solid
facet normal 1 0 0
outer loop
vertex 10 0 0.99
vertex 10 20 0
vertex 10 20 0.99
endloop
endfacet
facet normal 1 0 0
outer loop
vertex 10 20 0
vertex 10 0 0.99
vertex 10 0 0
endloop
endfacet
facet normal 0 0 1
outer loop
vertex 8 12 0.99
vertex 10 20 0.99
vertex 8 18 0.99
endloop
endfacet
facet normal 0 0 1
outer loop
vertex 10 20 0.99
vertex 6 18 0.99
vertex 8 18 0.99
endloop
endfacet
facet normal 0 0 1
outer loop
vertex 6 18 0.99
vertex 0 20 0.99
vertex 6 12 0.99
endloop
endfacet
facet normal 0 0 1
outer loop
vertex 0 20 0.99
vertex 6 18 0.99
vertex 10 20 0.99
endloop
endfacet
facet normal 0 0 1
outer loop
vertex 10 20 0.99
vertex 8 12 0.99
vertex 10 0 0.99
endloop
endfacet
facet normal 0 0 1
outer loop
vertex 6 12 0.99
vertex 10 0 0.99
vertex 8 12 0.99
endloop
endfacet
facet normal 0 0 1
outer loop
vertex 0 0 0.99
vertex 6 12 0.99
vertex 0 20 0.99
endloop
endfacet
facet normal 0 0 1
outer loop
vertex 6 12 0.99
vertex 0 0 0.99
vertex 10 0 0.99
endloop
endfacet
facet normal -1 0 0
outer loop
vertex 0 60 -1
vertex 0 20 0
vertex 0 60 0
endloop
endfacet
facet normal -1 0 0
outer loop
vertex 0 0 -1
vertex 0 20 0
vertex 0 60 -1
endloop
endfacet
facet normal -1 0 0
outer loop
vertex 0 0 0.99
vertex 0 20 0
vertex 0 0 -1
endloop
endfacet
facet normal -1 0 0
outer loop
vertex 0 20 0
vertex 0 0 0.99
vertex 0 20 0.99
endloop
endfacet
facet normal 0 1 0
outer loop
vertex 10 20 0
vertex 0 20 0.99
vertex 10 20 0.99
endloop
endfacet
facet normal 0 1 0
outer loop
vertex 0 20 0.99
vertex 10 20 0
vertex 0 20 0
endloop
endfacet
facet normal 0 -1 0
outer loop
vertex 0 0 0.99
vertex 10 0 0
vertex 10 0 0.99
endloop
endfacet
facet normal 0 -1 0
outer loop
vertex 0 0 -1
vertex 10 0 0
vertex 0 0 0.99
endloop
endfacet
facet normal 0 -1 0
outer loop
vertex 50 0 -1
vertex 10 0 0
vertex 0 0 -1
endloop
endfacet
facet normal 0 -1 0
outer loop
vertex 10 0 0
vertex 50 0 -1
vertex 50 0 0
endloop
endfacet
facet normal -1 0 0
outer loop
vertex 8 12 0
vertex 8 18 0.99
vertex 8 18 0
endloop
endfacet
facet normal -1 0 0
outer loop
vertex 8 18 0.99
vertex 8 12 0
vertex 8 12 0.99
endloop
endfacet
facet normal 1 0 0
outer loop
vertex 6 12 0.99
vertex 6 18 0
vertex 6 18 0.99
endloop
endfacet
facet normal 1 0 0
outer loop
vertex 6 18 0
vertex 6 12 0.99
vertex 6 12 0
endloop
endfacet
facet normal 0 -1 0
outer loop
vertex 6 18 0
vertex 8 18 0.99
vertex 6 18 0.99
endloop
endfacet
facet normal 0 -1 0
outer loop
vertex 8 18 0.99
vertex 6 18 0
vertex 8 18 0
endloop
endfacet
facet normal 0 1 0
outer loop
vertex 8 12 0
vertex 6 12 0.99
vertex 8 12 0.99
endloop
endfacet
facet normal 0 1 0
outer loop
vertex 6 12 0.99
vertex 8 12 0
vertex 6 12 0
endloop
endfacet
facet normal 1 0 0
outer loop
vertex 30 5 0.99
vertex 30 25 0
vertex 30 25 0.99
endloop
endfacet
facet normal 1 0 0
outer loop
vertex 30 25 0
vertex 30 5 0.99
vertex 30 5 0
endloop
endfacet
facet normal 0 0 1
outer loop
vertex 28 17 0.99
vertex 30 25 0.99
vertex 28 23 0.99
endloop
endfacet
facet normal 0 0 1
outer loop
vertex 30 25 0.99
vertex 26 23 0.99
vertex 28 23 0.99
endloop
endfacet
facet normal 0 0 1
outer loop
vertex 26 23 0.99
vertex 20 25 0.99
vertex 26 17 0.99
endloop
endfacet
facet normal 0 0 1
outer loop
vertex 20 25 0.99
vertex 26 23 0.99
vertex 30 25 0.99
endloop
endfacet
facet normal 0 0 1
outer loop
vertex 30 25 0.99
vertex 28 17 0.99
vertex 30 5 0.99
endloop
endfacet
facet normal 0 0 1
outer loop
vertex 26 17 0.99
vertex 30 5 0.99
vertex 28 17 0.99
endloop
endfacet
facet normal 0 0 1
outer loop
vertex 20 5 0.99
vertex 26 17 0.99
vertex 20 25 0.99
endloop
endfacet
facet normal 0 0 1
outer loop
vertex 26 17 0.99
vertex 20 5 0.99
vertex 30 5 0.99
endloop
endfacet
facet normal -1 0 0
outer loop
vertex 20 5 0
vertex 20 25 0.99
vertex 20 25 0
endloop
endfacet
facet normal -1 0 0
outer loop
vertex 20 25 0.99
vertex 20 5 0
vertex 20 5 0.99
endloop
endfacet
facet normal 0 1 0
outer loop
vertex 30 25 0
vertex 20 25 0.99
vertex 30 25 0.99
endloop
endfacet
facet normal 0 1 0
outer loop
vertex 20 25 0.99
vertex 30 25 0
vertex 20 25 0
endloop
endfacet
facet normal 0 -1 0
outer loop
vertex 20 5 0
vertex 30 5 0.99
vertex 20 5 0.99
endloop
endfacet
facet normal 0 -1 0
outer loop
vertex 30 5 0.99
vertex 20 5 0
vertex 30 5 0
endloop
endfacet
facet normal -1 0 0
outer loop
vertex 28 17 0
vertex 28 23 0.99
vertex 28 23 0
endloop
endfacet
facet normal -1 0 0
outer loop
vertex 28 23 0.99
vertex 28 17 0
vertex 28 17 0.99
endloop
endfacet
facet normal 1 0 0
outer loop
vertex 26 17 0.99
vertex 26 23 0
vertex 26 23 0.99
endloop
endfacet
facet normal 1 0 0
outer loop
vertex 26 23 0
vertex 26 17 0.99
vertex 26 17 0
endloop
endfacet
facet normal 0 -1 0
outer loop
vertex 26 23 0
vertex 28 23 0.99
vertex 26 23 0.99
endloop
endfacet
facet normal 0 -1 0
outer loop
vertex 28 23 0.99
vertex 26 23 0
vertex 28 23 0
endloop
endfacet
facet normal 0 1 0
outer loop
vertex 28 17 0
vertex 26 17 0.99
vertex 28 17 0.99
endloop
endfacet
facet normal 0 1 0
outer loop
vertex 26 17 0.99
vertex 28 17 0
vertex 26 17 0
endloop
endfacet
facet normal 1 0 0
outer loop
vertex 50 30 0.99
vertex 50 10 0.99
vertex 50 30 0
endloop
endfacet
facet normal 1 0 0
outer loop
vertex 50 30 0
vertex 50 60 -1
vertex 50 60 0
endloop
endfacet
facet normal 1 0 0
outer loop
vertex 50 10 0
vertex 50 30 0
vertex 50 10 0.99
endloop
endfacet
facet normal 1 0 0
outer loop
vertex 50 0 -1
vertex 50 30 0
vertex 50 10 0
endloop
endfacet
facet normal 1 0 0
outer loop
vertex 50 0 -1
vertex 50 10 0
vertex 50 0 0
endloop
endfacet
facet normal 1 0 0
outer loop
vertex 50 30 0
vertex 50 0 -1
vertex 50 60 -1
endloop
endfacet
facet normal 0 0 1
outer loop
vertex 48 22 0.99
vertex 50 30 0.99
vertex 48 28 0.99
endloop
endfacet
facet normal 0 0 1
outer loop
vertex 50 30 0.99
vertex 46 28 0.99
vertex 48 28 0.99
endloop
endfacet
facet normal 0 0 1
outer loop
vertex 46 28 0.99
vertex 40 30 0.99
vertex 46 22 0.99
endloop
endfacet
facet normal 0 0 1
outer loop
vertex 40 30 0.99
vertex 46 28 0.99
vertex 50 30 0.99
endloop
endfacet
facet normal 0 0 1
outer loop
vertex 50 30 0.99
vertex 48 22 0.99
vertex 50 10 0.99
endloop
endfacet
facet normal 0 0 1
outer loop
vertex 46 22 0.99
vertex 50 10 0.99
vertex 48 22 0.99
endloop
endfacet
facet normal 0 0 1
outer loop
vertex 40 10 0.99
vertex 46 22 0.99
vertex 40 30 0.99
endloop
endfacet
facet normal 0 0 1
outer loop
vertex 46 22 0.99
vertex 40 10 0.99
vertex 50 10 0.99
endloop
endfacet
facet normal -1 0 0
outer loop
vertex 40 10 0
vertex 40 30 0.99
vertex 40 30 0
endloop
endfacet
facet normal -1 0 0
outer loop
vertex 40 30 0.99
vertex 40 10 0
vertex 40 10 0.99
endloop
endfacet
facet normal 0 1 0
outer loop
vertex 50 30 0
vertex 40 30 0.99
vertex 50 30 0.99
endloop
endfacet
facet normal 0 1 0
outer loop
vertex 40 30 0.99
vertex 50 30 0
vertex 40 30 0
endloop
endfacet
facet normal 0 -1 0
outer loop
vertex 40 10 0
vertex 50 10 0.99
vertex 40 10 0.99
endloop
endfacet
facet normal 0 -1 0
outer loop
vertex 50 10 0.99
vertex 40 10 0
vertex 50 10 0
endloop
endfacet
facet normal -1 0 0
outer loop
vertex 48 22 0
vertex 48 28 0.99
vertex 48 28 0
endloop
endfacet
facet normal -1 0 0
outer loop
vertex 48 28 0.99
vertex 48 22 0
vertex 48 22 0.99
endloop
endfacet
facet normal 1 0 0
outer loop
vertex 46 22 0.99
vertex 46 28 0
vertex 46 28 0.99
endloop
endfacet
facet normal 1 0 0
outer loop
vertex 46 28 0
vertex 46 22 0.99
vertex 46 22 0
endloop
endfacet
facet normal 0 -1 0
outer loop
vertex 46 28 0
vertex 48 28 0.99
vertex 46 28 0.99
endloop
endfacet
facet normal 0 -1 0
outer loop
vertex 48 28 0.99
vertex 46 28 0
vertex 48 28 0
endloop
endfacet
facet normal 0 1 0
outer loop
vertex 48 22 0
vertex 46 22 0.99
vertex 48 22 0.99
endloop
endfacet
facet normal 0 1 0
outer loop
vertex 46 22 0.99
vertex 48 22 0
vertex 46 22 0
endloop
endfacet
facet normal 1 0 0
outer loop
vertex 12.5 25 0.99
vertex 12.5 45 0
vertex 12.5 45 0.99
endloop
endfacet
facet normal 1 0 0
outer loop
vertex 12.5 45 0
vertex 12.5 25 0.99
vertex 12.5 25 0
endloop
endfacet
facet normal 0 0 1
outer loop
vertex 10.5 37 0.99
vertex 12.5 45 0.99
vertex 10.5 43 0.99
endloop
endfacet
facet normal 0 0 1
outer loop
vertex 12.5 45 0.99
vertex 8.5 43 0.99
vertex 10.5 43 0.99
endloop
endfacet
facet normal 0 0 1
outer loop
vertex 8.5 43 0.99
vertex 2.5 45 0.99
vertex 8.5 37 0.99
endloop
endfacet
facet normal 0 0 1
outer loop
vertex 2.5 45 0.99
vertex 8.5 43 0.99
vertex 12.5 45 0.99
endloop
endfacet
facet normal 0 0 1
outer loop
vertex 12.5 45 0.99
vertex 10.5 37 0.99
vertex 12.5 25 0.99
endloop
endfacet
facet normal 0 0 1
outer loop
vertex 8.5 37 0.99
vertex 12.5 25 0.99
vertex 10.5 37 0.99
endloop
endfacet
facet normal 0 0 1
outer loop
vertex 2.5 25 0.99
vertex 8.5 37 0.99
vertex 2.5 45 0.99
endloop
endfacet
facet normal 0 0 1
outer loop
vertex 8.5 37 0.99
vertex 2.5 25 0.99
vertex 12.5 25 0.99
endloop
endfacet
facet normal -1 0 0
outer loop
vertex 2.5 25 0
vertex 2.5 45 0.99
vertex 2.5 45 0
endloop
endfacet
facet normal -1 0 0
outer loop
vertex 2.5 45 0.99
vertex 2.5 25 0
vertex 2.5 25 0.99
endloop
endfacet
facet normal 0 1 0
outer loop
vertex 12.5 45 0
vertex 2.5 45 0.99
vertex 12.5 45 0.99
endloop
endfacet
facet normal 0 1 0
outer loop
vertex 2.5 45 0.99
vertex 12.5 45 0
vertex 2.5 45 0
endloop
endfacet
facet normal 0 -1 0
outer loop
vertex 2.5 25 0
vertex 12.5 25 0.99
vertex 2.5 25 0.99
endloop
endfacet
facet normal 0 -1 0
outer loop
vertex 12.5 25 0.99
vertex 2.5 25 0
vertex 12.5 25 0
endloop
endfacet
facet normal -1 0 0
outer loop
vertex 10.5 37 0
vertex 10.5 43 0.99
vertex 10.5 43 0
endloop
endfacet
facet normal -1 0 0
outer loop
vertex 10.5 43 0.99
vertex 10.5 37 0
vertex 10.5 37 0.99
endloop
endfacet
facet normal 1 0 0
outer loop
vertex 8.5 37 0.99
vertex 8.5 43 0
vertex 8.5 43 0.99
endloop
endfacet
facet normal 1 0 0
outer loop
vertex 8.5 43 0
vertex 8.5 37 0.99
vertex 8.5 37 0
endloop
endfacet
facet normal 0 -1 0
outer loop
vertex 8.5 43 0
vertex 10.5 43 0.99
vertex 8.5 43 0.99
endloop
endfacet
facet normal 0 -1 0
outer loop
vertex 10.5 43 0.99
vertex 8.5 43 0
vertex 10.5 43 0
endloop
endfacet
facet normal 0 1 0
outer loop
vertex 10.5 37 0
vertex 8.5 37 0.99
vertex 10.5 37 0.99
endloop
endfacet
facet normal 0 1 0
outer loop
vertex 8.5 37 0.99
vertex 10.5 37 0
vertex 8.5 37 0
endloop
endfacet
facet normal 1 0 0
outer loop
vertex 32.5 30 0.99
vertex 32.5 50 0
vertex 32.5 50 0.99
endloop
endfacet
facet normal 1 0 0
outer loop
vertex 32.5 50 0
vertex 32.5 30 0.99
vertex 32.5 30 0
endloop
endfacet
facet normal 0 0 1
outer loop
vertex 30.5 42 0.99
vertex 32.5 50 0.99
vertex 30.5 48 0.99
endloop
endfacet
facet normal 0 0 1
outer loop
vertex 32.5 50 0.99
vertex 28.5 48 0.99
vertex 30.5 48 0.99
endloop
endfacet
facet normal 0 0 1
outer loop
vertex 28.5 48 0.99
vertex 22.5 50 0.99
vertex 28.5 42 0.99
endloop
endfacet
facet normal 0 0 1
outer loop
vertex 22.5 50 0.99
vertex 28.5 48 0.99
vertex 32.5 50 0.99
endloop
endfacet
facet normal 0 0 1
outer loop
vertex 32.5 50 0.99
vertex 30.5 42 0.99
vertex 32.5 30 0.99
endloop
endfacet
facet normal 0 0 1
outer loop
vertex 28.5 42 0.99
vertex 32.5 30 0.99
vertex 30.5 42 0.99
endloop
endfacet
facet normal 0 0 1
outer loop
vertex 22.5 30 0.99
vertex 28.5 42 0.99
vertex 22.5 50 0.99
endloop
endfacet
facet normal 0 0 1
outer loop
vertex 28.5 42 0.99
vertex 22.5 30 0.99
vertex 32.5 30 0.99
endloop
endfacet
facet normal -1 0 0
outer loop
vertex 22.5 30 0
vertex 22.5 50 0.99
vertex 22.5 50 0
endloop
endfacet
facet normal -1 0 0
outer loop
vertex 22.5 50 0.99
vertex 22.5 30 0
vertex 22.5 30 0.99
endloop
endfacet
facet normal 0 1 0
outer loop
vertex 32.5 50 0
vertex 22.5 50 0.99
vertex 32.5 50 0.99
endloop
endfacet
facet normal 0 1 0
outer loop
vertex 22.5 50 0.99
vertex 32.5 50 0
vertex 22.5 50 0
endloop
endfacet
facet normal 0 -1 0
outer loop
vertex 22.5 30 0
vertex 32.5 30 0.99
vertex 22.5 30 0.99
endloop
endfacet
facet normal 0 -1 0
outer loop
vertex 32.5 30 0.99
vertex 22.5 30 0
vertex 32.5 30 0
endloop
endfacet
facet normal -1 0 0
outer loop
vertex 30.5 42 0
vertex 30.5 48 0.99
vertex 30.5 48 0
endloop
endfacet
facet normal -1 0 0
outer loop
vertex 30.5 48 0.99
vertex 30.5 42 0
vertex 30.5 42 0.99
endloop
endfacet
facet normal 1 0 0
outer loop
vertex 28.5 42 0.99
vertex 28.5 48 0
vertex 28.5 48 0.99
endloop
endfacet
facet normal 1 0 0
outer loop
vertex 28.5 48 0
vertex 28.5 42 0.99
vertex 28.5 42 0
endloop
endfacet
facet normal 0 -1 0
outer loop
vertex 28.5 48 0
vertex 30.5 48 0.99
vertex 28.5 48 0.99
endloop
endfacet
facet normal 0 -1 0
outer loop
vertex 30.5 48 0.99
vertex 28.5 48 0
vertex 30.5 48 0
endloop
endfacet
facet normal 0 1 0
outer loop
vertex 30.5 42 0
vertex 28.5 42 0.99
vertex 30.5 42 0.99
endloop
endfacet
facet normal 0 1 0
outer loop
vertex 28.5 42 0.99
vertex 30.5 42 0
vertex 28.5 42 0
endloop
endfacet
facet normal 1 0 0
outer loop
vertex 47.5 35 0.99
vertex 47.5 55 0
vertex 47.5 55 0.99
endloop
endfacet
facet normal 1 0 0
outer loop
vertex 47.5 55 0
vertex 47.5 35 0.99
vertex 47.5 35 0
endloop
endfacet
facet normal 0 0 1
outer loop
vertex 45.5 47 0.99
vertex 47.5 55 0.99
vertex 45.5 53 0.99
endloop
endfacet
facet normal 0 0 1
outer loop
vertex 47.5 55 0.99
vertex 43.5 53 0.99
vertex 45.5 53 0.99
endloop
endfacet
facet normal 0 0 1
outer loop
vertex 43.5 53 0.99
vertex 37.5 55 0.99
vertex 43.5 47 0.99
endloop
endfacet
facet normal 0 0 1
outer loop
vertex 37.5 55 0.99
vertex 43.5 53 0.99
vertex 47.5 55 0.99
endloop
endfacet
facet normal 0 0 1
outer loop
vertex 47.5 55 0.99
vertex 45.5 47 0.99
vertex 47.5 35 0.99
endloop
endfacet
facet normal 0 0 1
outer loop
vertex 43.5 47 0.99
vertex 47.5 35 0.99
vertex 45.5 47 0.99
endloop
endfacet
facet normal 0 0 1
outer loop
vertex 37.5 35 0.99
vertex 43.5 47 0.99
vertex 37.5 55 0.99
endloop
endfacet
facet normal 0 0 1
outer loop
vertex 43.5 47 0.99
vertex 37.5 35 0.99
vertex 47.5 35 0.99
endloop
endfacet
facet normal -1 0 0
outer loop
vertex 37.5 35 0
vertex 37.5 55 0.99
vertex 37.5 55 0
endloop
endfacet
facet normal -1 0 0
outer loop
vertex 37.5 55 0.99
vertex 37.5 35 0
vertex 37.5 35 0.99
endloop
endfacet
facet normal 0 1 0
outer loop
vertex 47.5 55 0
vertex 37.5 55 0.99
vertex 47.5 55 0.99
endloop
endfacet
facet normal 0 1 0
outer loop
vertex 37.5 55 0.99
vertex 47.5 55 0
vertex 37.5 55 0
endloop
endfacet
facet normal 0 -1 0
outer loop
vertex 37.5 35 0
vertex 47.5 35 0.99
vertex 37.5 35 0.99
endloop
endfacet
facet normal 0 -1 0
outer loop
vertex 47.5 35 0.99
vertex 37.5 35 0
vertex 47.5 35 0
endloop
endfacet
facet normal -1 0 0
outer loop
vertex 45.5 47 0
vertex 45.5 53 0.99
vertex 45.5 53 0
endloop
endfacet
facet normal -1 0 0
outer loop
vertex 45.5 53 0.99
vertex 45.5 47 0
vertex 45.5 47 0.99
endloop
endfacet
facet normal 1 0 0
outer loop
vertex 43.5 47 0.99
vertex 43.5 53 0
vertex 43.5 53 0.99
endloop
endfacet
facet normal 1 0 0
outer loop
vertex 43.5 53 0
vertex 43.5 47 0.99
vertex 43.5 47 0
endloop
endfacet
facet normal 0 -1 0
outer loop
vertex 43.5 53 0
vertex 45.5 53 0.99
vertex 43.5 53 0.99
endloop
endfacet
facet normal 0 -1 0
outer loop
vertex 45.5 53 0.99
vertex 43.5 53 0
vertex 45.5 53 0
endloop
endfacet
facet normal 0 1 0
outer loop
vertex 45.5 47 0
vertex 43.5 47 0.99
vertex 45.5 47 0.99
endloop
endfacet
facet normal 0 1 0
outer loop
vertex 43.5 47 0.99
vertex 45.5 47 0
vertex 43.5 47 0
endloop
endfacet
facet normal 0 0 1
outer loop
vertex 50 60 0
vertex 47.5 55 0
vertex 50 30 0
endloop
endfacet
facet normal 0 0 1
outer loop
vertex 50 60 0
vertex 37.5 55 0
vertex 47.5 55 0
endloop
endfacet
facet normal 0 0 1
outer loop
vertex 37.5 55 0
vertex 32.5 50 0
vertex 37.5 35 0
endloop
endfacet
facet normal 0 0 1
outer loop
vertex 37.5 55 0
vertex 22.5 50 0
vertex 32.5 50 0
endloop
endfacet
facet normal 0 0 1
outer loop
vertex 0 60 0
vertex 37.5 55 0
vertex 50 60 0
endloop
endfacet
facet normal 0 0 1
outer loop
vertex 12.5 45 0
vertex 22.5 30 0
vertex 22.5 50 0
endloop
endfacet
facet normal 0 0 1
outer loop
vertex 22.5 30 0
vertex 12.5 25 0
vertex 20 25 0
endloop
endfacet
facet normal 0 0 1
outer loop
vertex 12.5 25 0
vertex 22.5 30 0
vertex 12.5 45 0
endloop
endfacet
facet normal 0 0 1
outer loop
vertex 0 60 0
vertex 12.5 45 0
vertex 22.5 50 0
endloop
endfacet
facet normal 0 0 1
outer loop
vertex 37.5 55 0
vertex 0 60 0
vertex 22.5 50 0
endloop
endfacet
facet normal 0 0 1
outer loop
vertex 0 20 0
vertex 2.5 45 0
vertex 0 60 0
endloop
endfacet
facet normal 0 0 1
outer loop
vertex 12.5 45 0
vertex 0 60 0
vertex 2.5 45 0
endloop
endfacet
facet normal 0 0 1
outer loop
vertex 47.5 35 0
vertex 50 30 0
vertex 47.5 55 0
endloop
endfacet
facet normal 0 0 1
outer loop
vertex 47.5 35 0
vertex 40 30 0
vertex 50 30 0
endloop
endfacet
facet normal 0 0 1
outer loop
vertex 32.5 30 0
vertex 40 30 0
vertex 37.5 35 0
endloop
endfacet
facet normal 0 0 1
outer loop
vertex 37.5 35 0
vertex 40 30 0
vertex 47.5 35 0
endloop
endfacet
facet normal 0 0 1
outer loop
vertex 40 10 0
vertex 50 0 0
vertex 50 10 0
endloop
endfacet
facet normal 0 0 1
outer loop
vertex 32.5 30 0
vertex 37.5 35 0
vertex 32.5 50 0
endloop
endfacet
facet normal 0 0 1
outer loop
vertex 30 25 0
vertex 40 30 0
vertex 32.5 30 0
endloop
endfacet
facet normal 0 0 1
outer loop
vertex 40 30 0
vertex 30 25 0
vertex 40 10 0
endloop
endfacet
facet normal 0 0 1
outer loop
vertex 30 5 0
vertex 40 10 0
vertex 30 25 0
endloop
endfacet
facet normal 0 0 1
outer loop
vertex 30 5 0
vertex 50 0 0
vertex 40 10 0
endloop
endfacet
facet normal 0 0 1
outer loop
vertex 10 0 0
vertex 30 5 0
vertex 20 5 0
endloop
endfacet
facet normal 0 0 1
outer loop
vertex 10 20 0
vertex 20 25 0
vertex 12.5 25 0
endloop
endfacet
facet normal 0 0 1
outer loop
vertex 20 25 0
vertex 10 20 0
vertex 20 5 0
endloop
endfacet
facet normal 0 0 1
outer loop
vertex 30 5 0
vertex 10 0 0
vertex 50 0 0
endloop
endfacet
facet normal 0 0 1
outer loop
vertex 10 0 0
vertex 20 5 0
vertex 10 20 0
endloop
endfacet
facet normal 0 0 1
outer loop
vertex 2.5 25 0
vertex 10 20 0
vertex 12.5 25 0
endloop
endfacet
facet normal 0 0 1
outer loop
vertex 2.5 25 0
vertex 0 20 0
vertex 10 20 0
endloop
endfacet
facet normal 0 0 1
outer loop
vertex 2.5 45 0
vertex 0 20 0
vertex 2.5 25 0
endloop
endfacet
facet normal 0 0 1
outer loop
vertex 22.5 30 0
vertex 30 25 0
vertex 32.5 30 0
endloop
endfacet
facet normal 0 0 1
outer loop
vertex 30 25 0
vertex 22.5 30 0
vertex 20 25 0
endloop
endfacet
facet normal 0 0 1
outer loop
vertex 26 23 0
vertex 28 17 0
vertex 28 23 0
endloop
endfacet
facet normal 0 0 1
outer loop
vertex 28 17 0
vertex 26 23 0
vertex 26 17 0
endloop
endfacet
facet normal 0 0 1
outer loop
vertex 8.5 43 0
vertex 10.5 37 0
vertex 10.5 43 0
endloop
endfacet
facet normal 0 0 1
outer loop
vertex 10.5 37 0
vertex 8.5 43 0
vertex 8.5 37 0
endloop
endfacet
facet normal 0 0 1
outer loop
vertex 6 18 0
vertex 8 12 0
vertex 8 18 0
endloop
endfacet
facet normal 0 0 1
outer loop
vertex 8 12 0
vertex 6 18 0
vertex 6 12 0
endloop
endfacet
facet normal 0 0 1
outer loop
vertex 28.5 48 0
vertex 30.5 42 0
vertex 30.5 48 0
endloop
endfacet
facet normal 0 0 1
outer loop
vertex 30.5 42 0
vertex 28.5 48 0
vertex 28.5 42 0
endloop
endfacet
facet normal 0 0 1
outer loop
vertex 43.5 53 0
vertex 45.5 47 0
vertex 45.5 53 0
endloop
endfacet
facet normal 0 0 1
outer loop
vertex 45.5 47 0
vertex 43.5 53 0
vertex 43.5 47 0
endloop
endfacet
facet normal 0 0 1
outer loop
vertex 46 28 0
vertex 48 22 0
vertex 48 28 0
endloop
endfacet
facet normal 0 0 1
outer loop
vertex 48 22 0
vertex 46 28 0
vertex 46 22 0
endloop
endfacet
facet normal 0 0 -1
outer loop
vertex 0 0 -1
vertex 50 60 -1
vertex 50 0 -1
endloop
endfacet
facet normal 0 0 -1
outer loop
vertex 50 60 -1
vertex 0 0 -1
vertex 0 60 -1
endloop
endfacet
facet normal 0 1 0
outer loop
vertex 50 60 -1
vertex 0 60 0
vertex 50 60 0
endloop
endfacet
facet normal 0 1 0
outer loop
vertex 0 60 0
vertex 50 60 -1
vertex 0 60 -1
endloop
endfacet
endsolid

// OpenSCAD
// file: ../TestHelper.scad
// Fischertechnik Box Foundation
// Test Helper

function getPlacementBaseSpace() = [50,60];
function getCubeSpace() = [10,20];

module PlacementBase() {
    color("green")
    translate([0, 0, -1])
        cube([getPlacementBaseSpace().x, getPlacementBaseSpace().y, 1]);
}

module Cube() {
    translate([0,0,-.01])
    difference() {
        cube([getCubeSpace().x,getCubeSpace().y,1]);
        translate([getCubeSpace().x*0.6, getCubeSpace().y*0.6, -1])
            cube([getCubeSpace().x*0.2,getCubeSpace().y*0.3,3]);
    }
}

module Deploy(distance=30) {
    for( i = [0:1:$children-1])
        translate([i*distance, 0])
            children(i);
}
// file: ../../Base/PlacementOptions.scad
// Fischertechnik Box Foundation
// Placement Options

// Alignment
NoAlign = 0;
AlignLeft = 1;
AlignBottom = 2;
AlignCenter = 3;
AlignRight = 4;
AlignTop = 5;

// Element rotation degree steps
rotations = [0, -90, -180, -270];

// Rotation
NoRotation = 0;
Rotate0 = 0;
Rotate90 = 1;
Rotate180 = 2;
Rotate270 = 3;

// Docking (seen from above)
NoDock = -1;
DockLeft = 0;
DockTop = 1;
DockRight = 2;
DockCorner = 2;
DockBottom = 3;

// Web corners
LowerLeft = 0;
UpperLeft = 1;
UpperRight = 2;
LowerRight = 3;

// Web position relative to corner
LeftOfCorner = 0;
RightOfCorner = 1;
// file: ../../Base/Alignment.scad
// Fischertechnik Box Foundation
// Geometry Helpers Alignment

include <PlacementOptions.scad>

// getAlignedX(elementWidth, spaceWidth, align=AlignRight, offset=0)
// Gets the aligned X offset of an element with the given
// width in the given space.
// elementWidth = The width of the element to positon
// spaceWidth = The space where the element should be aligned
// align = 0 AlignLeft, 1 AlignCenter, 2 AlignRight
// offset = an optional offset from the aligned position. When
// aligned left or centered, then positive values are in X direction.
// When aligned right then positive values are in negative X direction.

function getAlignedX(elementWidth, spaceWidth, align=AlignRight, offset=0) =
    (align == AlignLeft) ?
        offset :
        ((align == AlignCenter) ?
        (spaceWidth - elementWidth)/2 + offset :
        spaceWidth - offset - elementWidth);

// getAlignedY(elementDepth, spaceDepth, align=AlignTop, offset=0)
// Gets the aligned Y offset of an element with the given
// depth in the given space.
// elementDepth = The depth of the element to positon
// spaceDepth = The space where the element should be aligned
// align = 0 AlignBottom, 1 AlignCenter, 2 AlignTop
// offset = an optional offset from the aligned position. When
// aligned bottom or centered, then positive values are in Y direction.
// When aligned top then positive values are in negative Y direction.

function getAlignedY(elementDepth, spaceDepth, align=AlignTop, offset=0) =
    (align == AlignBottom) ?
        offset :
        ((align == AlignCenter) ?
        (spaceDepth - elementDepth)/2 + offset :
        spaceDepth - offset - elementDepth);
// main file
// Fischertechnik Box Foundation
// Geometry Helpers Alignment
// Test getAlignedX

use <../../Base/Alignment.scad>

include <../../Base/PlacementOptions.scad>

use <../TestHelper.scad>

PlacementBase();
leftOffset = getAlignedX(getCubeSpace().x, getPlacementBaseSpace().x, AlignLeft);
translate([leftOffset, 0, 0])
    Cube();

centerOffset = getAlignedX(getCubeSpace().x, getPlacementBaseSpace().x, AlignCenter);
translate([centerOffset, 5, 0])
    Cube();

rightOffset = getAlignedX(getCubeSpace().x, getPlacementBaseSpace().x, AlignRight);
translate([rightOffset, 10, 0])
    Cube();

leftWithOffset = getAlignedX(getCubeSpace().x, getPlacementBaseSpace().x, AlignLeft, 2.5);
translate([leftWithOffset, 25, 0])
    Cube();

centerWithOffset = getAlignedX(getCubeSpace().x, getPlacementBaseSpace().x, AlignCenter, 2.5);
translate([centerWithOffset, 30, 0])
    Cube();

rightWithOffset = getAlignedX(getCubeSpace().x, getPlacementBaseSpace().x, AlignRight, 2.5);
translate([rightWithOffset, 35, 0])
    Cube();
